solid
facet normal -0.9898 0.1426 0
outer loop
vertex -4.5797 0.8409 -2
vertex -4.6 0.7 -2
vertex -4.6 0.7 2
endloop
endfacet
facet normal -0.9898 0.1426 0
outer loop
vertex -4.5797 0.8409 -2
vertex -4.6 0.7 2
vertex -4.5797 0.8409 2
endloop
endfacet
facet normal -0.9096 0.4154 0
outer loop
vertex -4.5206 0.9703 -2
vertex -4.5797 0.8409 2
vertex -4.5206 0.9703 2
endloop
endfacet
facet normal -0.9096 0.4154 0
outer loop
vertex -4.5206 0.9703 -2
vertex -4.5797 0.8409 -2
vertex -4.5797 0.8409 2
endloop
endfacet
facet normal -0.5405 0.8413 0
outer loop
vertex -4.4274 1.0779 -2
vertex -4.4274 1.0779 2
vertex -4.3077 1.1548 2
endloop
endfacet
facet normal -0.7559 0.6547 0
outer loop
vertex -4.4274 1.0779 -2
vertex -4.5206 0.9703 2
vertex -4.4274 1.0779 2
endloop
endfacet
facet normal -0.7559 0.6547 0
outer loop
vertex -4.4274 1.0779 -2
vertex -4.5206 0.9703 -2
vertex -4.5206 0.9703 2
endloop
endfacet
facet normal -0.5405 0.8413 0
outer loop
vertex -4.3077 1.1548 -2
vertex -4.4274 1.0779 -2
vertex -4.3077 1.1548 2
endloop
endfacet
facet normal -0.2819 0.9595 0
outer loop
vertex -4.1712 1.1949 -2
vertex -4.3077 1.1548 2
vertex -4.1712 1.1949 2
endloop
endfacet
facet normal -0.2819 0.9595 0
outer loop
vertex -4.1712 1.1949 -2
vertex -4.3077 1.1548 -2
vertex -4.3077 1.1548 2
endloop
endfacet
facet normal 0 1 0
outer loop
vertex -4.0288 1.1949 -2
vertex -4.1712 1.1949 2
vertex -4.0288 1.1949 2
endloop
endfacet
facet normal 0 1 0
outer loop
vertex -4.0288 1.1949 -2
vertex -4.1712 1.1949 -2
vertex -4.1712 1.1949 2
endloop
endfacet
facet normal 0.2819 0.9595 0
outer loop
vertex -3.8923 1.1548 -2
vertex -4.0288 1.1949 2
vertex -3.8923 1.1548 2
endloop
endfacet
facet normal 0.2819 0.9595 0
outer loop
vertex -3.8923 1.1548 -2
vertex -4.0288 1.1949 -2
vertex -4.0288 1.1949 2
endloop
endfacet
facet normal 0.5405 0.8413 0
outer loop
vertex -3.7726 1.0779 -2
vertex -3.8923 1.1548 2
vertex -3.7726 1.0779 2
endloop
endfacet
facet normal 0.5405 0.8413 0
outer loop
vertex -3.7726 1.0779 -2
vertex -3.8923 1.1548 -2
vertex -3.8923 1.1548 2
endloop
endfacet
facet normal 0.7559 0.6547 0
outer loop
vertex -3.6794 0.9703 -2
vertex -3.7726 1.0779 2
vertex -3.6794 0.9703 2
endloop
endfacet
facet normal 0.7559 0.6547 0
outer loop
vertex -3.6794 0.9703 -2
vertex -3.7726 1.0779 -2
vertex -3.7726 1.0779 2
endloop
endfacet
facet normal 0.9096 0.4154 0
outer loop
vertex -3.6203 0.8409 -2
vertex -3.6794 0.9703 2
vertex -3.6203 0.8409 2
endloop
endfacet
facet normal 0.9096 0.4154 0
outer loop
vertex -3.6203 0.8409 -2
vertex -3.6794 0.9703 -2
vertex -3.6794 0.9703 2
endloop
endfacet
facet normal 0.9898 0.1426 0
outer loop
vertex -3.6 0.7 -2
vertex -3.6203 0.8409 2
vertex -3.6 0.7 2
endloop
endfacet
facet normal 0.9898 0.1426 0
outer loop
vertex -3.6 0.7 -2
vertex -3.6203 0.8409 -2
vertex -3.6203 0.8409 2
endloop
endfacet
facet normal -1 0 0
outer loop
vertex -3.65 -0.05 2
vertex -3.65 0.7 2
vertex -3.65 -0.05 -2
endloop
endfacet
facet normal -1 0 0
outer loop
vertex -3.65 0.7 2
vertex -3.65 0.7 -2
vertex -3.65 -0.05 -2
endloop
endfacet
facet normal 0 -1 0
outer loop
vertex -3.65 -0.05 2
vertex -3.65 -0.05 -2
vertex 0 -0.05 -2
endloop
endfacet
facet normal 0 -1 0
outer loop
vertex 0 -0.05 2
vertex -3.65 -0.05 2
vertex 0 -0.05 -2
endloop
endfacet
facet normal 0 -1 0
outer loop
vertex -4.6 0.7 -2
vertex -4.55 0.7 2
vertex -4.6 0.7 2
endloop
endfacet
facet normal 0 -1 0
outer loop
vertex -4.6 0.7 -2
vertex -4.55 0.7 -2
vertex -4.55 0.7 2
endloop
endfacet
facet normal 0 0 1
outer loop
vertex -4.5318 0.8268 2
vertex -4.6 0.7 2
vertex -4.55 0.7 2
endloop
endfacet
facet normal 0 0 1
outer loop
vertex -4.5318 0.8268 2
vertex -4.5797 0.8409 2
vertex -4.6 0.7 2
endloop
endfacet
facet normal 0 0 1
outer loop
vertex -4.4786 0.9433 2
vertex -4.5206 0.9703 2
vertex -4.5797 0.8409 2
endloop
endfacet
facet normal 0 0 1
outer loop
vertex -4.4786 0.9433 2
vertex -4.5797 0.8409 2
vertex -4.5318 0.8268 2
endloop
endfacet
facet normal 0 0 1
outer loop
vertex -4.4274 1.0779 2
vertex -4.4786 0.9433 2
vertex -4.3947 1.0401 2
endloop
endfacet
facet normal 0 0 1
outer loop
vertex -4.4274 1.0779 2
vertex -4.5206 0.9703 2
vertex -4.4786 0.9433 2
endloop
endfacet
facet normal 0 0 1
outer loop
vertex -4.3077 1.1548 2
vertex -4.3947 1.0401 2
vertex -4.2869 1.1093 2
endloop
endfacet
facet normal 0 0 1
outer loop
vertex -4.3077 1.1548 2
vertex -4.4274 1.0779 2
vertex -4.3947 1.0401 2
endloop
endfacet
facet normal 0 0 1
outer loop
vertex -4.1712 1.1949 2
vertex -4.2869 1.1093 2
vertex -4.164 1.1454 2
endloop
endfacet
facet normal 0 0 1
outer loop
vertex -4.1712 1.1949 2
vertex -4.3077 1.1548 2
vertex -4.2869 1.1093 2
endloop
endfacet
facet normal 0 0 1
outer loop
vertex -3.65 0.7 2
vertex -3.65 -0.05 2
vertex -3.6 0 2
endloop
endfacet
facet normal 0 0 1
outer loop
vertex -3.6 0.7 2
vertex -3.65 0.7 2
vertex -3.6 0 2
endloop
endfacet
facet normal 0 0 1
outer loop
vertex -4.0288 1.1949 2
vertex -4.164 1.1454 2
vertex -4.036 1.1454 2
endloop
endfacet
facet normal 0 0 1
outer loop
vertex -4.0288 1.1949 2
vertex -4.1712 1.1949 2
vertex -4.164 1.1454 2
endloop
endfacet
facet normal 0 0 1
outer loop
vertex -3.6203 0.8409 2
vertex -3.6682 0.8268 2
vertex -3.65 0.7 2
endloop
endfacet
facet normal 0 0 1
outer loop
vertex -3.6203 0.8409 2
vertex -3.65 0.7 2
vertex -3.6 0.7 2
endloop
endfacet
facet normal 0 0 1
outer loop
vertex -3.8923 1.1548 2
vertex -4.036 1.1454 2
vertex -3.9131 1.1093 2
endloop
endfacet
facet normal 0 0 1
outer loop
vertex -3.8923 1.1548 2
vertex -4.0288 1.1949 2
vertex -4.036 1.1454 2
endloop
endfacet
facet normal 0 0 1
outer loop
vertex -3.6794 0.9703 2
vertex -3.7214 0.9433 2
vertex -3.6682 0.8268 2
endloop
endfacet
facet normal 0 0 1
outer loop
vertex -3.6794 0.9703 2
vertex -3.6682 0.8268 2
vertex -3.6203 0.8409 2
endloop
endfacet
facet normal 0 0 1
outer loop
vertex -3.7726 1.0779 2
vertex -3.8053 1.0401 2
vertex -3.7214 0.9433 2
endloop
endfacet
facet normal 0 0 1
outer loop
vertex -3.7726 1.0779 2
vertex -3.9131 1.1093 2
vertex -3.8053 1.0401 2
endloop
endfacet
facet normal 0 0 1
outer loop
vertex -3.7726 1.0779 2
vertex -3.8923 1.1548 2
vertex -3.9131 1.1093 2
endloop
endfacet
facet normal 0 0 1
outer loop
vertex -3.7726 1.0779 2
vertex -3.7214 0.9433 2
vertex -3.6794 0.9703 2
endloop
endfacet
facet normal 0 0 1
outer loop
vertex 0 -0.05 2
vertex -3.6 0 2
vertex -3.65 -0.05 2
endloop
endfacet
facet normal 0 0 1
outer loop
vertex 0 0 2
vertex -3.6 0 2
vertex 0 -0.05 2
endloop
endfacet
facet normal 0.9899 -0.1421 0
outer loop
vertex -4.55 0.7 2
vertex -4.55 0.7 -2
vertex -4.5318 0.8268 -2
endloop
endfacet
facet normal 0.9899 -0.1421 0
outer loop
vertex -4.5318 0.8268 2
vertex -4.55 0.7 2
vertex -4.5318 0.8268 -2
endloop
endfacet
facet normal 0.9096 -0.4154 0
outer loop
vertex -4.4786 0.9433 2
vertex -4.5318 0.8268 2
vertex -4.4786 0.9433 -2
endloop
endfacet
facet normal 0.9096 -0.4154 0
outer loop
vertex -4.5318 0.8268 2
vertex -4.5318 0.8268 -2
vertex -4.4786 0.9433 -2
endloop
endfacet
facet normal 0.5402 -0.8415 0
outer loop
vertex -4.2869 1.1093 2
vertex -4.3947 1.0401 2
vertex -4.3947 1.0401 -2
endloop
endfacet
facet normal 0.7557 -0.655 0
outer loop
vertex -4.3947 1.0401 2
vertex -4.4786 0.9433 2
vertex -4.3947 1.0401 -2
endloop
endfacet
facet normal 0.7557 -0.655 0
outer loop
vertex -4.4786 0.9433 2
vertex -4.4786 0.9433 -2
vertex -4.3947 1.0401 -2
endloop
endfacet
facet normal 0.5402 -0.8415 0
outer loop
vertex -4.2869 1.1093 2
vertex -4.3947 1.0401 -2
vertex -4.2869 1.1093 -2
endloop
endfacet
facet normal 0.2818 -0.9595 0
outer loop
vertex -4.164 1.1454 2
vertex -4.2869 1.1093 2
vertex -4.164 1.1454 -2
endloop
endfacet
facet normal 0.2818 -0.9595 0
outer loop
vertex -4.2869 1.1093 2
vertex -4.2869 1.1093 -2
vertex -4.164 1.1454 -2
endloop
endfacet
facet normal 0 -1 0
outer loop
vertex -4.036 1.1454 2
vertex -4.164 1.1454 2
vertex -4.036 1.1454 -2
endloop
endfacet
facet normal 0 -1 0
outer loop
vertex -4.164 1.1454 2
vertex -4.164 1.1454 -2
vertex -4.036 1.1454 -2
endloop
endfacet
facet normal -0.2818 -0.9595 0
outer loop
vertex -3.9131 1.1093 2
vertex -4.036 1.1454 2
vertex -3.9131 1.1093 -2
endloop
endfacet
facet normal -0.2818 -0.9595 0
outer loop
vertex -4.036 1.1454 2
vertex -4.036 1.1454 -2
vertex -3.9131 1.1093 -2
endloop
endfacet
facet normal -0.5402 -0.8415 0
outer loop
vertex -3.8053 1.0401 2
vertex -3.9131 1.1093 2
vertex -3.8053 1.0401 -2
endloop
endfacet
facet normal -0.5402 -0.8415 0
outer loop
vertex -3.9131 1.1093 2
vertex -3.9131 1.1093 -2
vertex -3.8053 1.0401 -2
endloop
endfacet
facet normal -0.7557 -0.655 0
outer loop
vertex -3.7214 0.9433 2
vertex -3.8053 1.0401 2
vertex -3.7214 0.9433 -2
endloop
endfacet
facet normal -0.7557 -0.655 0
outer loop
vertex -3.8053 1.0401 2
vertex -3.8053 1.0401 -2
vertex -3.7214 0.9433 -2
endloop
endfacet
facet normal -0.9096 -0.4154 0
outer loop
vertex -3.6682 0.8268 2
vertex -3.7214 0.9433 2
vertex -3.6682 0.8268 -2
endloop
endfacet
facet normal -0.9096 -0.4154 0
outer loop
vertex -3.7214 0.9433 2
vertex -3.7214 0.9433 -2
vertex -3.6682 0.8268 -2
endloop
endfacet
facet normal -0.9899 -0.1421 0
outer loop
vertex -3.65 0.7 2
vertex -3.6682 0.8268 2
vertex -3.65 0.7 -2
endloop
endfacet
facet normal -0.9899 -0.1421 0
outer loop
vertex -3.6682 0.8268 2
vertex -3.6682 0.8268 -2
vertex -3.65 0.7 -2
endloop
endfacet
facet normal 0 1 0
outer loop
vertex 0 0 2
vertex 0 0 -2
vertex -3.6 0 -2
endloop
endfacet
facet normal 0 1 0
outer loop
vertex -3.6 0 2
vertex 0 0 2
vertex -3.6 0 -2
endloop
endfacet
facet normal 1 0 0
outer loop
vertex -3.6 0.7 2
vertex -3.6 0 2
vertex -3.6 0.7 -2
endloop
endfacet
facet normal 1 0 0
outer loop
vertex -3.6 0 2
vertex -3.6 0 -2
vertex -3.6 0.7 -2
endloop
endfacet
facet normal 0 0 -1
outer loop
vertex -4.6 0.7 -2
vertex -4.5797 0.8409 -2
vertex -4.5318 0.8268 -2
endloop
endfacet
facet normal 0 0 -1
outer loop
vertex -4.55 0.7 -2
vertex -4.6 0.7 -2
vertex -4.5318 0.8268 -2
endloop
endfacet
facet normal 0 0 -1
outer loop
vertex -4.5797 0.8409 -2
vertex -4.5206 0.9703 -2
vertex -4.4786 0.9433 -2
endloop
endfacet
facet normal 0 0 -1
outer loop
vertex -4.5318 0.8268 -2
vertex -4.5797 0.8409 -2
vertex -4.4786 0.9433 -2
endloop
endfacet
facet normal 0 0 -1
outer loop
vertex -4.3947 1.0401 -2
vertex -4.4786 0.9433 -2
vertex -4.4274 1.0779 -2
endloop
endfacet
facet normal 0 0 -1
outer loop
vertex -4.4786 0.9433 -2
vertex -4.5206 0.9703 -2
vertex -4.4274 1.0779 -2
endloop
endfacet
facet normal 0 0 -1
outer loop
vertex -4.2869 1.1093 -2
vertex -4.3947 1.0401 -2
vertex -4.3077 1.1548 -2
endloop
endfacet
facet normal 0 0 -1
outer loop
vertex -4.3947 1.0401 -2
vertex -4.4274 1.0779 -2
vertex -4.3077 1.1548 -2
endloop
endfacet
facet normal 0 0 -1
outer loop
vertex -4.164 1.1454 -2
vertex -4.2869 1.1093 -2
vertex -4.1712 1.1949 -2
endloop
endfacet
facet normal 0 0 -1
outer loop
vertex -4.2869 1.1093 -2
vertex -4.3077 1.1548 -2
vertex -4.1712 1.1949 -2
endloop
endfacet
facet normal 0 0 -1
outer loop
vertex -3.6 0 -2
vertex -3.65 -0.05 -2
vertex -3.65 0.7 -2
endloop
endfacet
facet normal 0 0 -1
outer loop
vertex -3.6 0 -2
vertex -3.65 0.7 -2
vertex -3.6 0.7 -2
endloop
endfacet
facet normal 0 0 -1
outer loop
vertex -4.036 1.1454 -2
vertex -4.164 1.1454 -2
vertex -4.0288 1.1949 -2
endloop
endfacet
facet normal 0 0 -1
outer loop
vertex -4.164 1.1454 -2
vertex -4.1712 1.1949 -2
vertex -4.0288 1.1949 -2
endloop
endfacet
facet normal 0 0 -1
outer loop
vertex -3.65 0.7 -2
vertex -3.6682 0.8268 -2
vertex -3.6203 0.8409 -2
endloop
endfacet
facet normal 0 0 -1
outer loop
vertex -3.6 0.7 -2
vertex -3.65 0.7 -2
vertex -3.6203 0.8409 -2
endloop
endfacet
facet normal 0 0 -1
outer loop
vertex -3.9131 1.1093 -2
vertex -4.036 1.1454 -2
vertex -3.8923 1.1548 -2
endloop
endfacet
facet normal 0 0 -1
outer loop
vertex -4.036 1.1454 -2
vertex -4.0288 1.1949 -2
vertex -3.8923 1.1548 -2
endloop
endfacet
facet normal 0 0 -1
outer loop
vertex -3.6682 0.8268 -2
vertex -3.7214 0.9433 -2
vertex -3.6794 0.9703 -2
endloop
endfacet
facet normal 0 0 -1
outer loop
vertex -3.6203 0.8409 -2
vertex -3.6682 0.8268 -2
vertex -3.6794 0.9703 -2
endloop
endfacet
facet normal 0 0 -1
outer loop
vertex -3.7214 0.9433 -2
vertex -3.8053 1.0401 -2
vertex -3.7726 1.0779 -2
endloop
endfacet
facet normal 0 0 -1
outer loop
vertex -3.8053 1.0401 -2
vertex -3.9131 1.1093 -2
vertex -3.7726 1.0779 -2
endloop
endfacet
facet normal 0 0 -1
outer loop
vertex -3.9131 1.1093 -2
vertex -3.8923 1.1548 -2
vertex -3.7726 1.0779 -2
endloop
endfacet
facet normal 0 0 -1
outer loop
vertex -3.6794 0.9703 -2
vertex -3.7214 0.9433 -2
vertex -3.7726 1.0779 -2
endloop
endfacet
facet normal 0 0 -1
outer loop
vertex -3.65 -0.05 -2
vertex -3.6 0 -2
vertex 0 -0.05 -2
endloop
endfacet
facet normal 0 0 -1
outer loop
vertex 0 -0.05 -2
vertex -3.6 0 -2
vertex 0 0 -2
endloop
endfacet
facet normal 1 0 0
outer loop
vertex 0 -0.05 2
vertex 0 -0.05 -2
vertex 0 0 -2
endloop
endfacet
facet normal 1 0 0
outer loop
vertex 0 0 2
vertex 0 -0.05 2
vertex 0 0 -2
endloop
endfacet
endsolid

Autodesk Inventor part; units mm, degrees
ref_plane "YZ Plane" through (0, 0, 0) normal (1, 0, 0) x (0, 1, 0)
ref_plane "XZ Plane" through (0, 0, 0) normal (0, 1, 0) x (-1, 0, 0)
ref_plane "XY Plane" through (0, 0, 0) normal (0, 0, 1) x (1, 0, 0)
sketch "Sketch1" plane through (0, 0, 0) normal (0, 0, 1) x (1, 0, 0)
  line L0 (0, 0) -> (-3.6, 0)
  line L1 (-3.6, 0) -> (-3.6, 0.7)
  arc A0 (-3.6, 0.7) -> (-4.6, 0.7) centre (-4.1, 0.7) ccw
  arc A1 (-3.65, 0.7) -> (-4.55, 0.7) centre (-4.1, 0.7) ccw
  line L2 (-3.65, 0.7) -> (-3.65, -0.05)
  line L3 (-3.65, -0.05) -> (0, -0.05)
  line L4 (-4.55, 0.7) -> (-4.6, 0.7)
  line L5 (0, -0.05) -> (0, 0)
  dimension "d1" = 0.5
  dimension "d2" = 0.7
  dimension "d3" = 4.6
  dimension "d4" = 0.05
extrude "Extrusion1" add sketch "Sketch1" along normal mid plane 4
equation "\"BendRadius\" = Thickness"
equation "\"BendReliefWidth\" = Thickness"
equation "\"BendReliefDepth\" = 0.5 * Thickness"
equation "\"CornerReliefSize\" = 4 * Thickness"
equation "\"MinimumRemnant\" = 2 * Thickness"
equation "\"TransitionRadius\" = BendRadius"
equation "\"JacobiRadiusSize\" = Thickness"
equation "\"GapSize\" = Thickness"
equation "\"Thickness\" = 0.5"
properties part number "SpaceQuest_interconnect_2" material "Stainless Steel"
